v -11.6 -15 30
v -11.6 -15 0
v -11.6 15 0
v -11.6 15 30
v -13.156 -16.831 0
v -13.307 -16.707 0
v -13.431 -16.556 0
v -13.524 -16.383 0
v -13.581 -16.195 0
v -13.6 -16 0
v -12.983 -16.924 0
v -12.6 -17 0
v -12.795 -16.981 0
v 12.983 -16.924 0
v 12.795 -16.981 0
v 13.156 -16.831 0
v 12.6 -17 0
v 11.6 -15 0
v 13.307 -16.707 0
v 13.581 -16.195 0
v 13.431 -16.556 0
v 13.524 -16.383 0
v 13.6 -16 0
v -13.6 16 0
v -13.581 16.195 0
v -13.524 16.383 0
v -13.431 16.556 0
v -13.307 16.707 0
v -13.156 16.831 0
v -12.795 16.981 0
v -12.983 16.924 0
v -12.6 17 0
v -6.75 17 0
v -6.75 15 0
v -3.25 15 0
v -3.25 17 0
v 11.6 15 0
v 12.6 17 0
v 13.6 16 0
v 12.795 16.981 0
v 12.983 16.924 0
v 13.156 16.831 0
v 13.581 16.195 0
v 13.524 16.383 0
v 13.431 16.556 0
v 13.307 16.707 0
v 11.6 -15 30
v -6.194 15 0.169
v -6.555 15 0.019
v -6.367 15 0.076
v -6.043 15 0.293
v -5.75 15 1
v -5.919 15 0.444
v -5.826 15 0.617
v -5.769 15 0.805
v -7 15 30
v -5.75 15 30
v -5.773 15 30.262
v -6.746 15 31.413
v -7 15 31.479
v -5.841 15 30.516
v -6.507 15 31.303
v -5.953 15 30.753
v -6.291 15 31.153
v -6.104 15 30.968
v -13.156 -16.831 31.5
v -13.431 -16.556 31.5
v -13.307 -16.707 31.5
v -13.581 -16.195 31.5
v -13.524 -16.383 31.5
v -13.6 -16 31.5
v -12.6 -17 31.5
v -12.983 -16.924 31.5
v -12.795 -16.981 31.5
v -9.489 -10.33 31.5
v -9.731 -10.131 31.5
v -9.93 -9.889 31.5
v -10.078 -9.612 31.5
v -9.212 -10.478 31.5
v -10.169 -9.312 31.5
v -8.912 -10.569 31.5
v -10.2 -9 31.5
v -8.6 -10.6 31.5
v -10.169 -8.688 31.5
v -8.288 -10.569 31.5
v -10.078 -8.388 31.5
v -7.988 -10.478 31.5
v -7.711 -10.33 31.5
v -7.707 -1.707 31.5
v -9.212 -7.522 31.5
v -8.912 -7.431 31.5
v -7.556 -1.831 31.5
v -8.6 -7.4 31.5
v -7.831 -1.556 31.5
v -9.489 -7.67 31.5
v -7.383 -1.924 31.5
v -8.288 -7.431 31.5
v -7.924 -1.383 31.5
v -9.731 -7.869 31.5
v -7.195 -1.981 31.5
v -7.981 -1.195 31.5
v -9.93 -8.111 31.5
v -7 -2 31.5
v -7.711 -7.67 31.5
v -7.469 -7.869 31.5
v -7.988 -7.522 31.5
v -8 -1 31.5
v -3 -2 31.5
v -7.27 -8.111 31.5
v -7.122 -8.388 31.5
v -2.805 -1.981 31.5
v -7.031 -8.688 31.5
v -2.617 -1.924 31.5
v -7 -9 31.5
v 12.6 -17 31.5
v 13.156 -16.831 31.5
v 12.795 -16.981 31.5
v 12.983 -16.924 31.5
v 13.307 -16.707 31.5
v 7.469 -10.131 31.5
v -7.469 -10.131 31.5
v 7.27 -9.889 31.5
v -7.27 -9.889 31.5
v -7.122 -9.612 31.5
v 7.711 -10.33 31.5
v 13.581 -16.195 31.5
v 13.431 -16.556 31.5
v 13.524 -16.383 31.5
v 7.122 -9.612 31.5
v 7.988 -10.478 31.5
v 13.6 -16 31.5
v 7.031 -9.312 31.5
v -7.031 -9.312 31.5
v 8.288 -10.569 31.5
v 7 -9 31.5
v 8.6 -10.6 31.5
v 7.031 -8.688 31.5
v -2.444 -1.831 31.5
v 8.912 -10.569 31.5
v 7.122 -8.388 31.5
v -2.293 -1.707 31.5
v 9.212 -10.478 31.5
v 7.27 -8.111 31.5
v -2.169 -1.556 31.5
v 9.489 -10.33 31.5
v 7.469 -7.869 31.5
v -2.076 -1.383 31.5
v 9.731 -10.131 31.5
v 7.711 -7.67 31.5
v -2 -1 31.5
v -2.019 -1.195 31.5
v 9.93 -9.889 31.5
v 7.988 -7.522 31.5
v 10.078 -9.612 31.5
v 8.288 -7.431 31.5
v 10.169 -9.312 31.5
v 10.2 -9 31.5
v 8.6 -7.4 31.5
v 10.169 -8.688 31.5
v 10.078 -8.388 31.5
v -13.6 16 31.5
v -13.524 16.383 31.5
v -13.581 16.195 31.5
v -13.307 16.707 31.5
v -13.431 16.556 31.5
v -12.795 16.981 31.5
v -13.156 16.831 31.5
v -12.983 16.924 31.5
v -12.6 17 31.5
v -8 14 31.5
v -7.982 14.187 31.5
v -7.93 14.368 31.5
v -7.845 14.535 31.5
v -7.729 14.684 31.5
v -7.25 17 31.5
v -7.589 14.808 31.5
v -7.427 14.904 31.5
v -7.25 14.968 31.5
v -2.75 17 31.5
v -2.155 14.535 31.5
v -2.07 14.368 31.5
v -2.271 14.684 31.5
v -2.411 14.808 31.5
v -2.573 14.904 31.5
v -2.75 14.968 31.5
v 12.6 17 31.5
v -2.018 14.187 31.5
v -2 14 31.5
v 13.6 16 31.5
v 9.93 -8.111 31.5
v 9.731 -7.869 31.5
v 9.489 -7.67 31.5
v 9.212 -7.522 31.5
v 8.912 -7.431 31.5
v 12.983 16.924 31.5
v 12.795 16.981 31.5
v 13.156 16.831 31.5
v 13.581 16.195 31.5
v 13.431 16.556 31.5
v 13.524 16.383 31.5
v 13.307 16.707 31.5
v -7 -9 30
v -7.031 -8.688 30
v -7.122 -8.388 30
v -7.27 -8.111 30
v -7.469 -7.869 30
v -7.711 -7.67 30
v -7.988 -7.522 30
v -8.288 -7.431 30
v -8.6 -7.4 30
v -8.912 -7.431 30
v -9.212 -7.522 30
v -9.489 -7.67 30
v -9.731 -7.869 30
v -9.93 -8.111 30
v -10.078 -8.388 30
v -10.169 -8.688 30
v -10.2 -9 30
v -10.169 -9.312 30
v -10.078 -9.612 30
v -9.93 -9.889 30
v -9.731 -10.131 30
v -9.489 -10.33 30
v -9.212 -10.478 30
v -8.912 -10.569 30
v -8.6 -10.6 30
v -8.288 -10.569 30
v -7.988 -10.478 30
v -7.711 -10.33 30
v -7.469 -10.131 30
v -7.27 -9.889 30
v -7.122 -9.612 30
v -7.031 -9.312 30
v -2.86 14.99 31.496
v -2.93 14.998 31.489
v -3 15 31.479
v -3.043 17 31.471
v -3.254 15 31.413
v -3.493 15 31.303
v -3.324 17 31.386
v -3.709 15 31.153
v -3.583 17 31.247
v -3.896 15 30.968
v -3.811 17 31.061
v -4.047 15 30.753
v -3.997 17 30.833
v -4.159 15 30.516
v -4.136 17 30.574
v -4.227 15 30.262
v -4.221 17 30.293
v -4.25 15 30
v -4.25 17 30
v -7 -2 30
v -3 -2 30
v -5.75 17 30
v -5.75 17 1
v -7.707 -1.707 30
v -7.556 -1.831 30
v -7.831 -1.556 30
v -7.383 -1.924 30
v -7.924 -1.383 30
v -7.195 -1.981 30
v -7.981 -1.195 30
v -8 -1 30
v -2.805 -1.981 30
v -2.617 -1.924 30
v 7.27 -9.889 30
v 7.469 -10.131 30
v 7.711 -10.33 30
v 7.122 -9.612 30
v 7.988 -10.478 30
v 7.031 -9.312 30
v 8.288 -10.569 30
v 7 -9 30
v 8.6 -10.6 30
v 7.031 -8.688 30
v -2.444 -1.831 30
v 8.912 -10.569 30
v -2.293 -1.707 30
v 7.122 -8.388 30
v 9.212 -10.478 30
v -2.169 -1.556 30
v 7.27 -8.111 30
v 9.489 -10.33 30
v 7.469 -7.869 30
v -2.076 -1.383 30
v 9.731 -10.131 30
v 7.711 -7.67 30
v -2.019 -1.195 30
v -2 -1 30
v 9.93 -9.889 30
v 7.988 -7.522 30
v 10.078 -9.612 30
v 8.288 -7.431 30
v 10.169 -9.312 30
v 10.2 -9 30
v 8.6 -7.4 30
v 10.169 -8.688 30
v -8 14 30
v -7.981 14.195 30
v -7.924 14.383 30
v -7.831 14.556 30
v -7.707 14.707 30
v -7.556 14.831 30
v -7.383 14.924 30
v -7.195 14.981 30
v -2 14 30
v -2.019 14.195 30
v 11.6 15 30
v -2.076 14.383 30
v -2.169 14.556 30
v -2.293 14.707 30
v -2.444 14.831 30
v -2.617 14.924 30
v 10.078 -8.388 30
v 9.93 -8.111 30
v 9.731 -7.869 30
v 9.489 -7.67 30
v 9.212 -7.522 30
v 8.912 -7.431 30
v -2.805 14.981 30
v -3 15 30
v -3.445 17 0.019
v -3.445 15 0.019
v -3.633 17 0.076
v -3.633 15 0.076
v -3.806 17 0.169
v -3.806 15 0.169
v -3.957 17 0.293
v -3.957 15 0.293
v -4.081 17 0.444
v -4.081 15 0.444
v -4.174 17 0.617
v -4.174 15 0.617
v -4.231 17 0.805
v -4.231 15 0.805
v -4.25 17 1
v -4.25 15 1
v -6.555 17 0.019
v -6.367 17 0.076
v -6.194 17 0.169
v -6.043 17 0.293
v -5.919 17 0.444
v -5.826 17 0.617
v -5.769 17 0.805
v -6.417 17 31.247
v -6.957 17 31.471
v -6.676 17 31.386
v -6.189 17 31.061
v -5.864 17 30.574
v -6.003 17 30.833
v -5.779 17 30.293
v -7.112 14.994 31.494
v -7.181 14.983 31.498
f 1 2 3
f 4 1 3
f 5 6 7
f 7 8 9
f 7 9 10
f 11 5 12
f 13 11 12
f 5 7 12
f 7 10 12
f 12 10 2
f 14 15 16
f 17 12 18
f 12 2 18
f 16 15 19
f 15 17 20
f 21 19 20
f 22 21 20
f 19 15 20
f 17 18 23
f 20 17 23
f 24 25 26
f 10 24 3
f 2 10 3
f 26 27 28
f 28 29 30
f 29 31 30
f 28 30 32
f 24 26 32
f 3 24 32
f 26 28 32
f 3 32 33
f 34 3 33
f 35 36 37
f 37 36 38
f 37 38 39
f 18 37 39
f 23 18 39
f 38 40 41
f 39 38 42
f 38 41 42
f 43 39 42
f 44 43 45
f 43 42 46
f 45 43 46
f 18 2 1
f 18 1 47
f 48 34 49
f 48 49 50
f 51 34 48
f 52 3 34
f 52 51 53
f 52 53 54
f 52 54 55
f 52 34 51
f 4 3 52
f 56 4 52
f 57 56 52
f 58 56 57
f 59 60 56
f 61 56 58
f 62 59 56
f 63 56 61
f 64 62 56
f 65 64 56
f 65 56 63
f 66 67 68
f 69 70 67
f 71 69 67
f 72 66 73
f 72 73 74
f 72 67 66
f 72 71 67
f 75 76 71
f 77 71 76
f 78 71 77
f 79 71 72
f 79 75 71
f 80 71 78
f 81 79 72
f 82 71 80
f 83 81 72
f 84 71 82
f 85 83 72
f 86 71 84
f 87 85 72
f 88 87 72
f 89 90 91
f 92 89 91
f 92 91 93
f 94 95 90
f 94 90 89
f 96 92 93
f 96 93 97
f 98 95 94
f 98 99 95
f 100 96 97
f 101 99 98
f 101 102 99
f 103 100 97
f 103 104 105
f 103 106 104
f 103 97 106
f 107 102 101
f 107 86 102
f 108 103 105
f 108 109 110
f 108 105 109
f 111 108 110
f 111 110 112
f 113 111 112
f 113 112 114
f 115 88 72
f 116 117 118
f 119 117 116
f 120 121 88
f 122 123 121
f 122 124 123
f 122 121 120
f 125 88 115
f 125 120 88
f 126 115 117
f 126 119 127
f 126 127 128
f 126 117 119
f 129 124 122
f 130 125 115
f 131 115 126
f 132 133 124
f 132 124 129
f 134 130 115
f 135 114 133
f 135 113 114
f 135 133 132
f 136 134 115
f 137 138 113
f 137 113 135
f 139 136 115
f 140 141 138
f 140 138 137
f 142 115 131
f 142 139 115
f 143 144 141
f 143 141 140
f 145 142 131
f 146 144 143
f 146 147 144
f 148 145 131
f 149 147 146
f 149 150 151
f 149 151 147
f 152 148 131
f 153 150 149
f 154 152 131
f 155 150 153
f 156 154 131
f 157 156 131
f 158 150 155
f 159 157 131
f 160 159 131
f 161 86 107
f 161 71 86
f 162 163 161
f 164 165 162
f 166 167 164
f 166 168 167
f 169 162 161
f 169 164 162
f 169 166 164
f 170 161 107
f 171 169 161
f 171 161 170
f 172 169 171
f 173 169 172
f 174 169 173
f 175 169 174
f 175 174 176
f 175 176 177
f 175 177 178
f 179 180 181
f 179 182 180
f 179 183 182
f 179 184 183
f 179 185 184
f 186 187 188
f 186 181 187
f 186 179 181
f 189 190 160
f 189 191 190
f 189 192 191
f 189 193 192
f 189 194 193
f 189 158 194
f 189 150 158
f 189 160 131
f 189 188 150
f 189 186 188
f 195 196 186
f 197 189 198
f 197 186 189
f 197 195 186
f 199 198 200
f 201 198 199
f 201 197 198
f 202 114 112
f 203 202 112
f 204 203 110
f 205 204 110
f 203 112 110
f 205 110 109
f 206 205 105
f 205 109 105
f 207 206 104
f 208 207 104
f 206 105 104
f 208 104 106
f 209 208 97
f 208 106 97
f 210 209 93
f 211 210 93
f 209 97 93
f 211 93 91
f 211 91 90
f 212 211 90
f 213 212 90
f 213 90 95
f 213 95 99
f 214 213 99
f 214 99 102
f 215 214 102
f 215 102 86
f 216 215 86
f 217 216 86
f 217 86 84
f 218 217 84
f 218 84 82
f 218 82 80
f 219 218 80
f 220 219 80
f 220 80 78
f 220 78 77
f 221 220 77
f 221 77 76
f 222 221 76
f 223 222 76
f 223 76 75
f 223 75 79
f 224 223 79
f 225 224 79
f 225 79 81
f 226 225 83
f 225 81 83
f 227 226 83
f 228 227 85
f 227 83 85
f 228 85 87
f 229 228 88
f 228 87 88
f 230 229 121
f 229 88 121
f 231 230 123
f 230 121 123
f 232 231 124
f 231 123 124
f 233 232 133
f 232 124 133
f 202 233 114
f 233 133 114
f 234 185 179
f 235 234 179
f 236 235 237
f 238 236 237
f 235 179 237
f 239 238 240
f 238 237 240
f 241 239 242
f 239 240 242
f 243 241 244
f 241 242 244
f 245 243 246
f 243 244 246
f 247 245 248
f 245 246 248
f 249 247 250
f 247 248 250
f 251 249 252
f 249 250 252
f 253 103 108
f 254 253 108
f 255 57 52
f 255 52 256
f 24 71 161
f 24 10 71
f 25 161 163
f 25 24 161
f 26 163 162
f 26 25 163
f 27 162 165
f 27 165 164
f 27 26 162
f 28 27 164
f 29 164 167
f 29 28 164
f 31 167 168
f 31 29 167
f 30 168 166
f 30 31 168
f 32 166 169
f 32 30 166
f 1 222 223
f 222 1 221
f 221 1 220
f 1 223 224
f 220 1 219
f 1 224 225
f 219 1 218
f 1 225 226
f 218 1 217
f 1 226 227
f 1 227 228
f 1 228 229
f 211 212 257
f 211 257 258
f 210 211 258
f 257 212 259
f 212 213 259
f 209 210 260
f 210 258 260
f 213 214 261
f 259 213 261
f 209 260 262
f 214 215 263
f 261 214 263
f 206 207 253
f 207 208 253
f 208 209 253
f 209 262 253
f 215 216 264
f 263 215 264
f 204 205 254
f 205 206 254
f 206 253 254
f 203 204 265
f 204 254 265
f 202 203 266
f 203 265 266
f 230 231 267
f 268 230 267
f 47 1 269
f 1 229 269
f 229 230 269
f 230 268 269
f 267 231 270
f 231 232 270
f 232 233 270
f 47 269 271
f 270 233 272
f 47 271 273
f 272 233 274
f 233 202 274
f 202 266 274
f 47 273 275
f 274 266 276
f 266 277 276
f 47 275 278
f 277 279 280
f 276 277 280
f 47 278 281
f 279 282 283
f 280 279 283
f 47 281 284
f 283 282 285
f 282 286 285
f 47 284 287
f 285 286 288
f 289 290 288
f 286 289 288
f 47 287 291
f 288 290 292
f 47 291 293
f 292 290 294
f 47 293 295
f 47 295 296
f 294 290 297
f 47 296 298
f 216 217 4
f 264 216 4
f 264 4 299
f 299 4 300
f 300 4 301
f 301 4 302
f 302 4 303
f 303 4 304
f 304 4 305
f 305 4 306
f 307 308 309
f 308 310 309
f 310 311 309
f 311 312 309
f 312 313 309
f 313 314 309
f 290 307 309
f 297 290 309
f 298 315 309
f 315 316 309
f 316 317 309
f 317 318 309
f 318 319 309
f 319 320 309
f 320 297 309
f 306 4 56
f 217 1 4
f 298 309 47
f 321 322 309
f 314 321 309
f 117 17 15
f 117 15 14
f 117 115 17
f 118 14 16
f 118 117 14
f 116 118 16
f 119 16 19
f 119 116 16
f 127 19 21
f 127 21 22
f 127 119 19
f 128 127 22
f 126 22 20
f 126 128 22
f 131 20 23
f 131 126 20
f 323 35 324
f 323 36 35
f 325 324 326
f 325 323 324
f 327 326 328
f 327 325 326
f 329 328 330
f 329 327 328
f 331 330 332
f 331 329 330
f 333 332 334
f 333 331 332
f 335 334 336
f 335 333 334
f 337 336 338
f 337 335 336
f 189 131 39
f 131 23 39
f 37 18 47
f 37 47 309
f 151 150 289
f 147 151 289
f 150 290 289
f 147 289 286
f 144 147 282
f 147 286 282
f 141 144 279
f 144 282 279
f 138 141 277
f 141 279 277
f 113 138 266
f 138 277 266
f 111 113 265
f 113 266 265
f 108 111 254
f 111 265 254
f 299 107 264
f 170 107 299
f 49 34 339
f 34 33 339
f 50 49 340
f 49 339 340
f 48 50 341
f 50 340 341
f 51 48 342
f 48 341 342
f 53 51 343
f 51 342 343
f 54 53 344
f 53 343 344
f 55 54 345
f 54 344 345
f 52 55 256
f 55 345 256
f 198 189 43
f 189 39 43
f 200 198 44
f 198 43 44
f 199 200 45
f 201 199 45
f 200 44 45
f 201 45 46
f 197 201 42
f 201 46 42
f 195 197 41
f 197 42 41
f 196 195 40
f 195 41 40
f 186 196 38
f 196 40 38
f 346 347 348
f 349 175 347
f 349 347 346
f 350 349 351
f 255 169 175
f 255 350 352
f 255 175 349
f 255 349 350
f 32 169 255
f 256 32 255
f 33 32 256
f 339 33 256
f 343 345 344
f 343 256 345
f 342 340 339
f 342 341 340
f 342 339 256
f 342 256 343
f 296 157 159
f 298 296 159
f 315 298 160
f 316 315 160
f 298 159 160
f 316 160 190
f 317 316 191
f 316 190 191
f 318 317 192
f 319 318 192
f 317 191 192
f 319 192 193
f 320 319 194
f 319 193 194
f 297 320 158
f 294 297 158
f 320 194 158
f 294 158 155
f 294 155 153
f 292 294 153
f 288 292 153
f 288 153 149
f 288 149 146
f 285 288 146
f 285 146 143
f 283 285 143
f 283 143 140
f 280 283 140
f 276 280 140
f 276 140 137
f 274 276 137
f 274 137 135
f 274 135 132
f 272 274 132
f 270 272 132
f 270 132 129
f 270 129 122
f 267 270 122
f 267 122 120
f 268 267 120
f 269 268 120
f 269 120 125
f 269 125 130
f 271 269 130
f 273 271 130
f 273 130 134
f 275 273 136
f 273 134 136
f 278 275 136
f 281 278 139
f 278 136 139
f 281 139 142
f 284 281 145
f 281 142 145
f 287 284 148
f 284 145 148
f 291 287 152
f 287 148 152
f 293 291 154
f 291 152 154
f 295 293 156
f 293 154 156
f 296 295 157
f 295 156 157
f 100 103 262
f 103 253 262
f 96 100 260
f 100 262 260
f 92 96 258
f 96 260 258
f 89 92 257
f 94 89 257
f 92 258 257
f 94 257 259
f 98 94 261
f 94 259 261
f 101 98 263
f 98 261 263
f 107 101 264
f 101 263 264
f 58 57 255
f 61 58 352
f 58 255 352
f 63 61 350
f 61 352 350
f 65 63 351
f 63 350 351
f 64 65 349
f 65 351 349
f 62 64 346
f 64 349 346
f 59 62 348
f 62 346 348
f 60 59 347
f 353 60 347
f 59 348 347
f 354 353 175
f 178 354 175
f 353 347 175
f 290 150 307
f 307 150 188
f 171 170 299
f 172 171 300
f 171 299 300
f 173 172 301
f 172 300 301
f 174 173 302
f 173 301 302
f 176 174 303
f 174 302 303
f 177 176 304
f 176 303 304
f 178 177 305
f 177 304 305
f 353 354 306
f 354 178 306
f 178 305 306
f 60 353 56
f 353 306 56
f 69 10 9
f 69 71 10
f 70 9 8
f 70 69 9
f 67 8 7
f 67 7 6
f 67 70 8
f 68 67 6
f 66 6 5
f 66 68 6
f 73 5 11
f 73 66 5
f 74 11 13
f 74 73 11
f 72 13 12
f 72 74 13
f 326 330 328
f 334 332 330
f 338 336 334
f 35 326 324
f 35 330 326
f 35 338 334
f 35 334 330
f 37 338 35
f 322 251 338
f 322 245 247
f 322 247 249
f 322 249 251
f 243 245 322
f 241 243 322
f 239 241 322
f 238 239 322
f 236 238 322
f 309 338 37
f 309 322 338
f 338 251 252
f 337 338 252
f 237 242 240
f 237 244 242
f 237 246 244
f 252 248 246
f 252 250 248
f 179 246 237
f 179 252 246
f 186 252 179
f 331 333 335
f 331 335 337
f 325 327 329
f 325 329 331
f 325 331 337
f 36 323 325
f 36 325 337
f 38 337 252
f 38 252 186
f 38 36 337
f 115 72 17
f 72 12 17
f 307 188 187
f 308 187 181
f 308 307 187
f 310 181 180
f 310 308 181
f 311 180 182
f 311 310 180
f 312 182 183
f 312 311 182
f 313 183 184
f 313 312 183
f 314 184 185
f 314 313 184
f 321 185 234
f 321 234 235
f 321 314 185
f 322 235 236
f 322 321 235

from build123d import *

# Parameters (mm, degrees)
SKETCH1_W           = 27.2
SKETCH1_H           = 34
SKETCH1_W_2         = 23.2
SKETCH1_H_2         = 30
BOSS_EXTRUDE1_DEPTH = 30
SKETCH2_W           = 27.2
SKETCH2_H           = 34
BOSS_EXTRUDE2_DEPTH = 1.5
SKETCH3_W           = 6
SKETCH3_H           = 17
SKETCH3_R           = 1.6
CUT_EXTRUDE1_DEPTH  = 31.5
FILLET1_R           = 1
SKETCH4_W           = 1.5
SKETCH4_H           = 2
CUT_EXTRUDE2_DEPTH  = 31.5
FILLET2_R           = 1
FILLET3_R           = 1.5


with BuildPart() as part:
    # Sketch1 → Boss-Extrude1 (new body)
    with BuildSketch(Plane.XY):
        Rectangle(SKETCH1_W, SKETCH1_H)
        Rectangle(SKETCH1_W_2, SKETCH1_H_2, mode=Mode.SUBTRACT)
    extrude(amount=BOSS_EXTRUDE1_DEPTH)

    # Sketch2 → Boss-Extrude2 (add)
    with BuildSketch(Plane.XY.offset(30)):
        Rectangle(SKETCH2_W, SKETCH2_H)
    extrude(amount=BOSS_EXTRUDE2_DEPTH)

    # Sketch3 → Cut-Extrude1 (cut)
    with BuildSketch(Plane.XY.offset(31.5)):
        with Locations((-5, 6.5)):
            Rectangle(SKETCH3_W, SKETCH3_H)
        with Locations((-8.6, -9)):
            Circle(SKETCH3_R)
        with Locations((8.6, -9)):
            Circle(SKETCH3_R)
    extrude(amount=-CUT_EXTRUDE1_DEPTH, mode=Mode.SUBTRACT)

    # Fillet1
    fillet1_edges = [part.edges().sort_by_distance(p)[0] for p in [
        (-8, -2, 30.75),
        (-2, -2, 30.75),
        (-2, 15, 30.75),
        (-8, 15, 30.75),
        (-13.6, 17, 15.75),
        (13.6, 17, 15.75),
        (13.6, -17, 15.75),
        (-13.6, -17, 15.75),
    ]]
    fillet(fillet1_edges, radius=FILLET1_R)

    # Sketch4 → Cut-Extrude2 (cut)
    with BuildSketch(Plane.XY.offset(31.5)):
        with Locations((-5, 16)):
            Rectangle(SKETCH4_W, SKETCH4_H)
    extrude(amount=-CUT_EXTRUDE2_DEPTH, mode=Mode.SUBTRACT)

    # Fillet2
    fillet2_edges = [part.edges().sort_by_distance(p)[0] for p in [
        (-4.25, 16, 0),
        (-5.75, 16, 0),
    ]]
    fillet(fillet2_edges, radius=FILLET2_R)

    # Fillet3
    fillet3_edges = [part.edges().sort_by_distance(p)[0] for p in [
        (-5.75, 16, 31.5),
        (-4.25, 16, 31.5),
    ]]
    fillet(fillet3_edges, radius=FILLET3_R)


solid = part.part
